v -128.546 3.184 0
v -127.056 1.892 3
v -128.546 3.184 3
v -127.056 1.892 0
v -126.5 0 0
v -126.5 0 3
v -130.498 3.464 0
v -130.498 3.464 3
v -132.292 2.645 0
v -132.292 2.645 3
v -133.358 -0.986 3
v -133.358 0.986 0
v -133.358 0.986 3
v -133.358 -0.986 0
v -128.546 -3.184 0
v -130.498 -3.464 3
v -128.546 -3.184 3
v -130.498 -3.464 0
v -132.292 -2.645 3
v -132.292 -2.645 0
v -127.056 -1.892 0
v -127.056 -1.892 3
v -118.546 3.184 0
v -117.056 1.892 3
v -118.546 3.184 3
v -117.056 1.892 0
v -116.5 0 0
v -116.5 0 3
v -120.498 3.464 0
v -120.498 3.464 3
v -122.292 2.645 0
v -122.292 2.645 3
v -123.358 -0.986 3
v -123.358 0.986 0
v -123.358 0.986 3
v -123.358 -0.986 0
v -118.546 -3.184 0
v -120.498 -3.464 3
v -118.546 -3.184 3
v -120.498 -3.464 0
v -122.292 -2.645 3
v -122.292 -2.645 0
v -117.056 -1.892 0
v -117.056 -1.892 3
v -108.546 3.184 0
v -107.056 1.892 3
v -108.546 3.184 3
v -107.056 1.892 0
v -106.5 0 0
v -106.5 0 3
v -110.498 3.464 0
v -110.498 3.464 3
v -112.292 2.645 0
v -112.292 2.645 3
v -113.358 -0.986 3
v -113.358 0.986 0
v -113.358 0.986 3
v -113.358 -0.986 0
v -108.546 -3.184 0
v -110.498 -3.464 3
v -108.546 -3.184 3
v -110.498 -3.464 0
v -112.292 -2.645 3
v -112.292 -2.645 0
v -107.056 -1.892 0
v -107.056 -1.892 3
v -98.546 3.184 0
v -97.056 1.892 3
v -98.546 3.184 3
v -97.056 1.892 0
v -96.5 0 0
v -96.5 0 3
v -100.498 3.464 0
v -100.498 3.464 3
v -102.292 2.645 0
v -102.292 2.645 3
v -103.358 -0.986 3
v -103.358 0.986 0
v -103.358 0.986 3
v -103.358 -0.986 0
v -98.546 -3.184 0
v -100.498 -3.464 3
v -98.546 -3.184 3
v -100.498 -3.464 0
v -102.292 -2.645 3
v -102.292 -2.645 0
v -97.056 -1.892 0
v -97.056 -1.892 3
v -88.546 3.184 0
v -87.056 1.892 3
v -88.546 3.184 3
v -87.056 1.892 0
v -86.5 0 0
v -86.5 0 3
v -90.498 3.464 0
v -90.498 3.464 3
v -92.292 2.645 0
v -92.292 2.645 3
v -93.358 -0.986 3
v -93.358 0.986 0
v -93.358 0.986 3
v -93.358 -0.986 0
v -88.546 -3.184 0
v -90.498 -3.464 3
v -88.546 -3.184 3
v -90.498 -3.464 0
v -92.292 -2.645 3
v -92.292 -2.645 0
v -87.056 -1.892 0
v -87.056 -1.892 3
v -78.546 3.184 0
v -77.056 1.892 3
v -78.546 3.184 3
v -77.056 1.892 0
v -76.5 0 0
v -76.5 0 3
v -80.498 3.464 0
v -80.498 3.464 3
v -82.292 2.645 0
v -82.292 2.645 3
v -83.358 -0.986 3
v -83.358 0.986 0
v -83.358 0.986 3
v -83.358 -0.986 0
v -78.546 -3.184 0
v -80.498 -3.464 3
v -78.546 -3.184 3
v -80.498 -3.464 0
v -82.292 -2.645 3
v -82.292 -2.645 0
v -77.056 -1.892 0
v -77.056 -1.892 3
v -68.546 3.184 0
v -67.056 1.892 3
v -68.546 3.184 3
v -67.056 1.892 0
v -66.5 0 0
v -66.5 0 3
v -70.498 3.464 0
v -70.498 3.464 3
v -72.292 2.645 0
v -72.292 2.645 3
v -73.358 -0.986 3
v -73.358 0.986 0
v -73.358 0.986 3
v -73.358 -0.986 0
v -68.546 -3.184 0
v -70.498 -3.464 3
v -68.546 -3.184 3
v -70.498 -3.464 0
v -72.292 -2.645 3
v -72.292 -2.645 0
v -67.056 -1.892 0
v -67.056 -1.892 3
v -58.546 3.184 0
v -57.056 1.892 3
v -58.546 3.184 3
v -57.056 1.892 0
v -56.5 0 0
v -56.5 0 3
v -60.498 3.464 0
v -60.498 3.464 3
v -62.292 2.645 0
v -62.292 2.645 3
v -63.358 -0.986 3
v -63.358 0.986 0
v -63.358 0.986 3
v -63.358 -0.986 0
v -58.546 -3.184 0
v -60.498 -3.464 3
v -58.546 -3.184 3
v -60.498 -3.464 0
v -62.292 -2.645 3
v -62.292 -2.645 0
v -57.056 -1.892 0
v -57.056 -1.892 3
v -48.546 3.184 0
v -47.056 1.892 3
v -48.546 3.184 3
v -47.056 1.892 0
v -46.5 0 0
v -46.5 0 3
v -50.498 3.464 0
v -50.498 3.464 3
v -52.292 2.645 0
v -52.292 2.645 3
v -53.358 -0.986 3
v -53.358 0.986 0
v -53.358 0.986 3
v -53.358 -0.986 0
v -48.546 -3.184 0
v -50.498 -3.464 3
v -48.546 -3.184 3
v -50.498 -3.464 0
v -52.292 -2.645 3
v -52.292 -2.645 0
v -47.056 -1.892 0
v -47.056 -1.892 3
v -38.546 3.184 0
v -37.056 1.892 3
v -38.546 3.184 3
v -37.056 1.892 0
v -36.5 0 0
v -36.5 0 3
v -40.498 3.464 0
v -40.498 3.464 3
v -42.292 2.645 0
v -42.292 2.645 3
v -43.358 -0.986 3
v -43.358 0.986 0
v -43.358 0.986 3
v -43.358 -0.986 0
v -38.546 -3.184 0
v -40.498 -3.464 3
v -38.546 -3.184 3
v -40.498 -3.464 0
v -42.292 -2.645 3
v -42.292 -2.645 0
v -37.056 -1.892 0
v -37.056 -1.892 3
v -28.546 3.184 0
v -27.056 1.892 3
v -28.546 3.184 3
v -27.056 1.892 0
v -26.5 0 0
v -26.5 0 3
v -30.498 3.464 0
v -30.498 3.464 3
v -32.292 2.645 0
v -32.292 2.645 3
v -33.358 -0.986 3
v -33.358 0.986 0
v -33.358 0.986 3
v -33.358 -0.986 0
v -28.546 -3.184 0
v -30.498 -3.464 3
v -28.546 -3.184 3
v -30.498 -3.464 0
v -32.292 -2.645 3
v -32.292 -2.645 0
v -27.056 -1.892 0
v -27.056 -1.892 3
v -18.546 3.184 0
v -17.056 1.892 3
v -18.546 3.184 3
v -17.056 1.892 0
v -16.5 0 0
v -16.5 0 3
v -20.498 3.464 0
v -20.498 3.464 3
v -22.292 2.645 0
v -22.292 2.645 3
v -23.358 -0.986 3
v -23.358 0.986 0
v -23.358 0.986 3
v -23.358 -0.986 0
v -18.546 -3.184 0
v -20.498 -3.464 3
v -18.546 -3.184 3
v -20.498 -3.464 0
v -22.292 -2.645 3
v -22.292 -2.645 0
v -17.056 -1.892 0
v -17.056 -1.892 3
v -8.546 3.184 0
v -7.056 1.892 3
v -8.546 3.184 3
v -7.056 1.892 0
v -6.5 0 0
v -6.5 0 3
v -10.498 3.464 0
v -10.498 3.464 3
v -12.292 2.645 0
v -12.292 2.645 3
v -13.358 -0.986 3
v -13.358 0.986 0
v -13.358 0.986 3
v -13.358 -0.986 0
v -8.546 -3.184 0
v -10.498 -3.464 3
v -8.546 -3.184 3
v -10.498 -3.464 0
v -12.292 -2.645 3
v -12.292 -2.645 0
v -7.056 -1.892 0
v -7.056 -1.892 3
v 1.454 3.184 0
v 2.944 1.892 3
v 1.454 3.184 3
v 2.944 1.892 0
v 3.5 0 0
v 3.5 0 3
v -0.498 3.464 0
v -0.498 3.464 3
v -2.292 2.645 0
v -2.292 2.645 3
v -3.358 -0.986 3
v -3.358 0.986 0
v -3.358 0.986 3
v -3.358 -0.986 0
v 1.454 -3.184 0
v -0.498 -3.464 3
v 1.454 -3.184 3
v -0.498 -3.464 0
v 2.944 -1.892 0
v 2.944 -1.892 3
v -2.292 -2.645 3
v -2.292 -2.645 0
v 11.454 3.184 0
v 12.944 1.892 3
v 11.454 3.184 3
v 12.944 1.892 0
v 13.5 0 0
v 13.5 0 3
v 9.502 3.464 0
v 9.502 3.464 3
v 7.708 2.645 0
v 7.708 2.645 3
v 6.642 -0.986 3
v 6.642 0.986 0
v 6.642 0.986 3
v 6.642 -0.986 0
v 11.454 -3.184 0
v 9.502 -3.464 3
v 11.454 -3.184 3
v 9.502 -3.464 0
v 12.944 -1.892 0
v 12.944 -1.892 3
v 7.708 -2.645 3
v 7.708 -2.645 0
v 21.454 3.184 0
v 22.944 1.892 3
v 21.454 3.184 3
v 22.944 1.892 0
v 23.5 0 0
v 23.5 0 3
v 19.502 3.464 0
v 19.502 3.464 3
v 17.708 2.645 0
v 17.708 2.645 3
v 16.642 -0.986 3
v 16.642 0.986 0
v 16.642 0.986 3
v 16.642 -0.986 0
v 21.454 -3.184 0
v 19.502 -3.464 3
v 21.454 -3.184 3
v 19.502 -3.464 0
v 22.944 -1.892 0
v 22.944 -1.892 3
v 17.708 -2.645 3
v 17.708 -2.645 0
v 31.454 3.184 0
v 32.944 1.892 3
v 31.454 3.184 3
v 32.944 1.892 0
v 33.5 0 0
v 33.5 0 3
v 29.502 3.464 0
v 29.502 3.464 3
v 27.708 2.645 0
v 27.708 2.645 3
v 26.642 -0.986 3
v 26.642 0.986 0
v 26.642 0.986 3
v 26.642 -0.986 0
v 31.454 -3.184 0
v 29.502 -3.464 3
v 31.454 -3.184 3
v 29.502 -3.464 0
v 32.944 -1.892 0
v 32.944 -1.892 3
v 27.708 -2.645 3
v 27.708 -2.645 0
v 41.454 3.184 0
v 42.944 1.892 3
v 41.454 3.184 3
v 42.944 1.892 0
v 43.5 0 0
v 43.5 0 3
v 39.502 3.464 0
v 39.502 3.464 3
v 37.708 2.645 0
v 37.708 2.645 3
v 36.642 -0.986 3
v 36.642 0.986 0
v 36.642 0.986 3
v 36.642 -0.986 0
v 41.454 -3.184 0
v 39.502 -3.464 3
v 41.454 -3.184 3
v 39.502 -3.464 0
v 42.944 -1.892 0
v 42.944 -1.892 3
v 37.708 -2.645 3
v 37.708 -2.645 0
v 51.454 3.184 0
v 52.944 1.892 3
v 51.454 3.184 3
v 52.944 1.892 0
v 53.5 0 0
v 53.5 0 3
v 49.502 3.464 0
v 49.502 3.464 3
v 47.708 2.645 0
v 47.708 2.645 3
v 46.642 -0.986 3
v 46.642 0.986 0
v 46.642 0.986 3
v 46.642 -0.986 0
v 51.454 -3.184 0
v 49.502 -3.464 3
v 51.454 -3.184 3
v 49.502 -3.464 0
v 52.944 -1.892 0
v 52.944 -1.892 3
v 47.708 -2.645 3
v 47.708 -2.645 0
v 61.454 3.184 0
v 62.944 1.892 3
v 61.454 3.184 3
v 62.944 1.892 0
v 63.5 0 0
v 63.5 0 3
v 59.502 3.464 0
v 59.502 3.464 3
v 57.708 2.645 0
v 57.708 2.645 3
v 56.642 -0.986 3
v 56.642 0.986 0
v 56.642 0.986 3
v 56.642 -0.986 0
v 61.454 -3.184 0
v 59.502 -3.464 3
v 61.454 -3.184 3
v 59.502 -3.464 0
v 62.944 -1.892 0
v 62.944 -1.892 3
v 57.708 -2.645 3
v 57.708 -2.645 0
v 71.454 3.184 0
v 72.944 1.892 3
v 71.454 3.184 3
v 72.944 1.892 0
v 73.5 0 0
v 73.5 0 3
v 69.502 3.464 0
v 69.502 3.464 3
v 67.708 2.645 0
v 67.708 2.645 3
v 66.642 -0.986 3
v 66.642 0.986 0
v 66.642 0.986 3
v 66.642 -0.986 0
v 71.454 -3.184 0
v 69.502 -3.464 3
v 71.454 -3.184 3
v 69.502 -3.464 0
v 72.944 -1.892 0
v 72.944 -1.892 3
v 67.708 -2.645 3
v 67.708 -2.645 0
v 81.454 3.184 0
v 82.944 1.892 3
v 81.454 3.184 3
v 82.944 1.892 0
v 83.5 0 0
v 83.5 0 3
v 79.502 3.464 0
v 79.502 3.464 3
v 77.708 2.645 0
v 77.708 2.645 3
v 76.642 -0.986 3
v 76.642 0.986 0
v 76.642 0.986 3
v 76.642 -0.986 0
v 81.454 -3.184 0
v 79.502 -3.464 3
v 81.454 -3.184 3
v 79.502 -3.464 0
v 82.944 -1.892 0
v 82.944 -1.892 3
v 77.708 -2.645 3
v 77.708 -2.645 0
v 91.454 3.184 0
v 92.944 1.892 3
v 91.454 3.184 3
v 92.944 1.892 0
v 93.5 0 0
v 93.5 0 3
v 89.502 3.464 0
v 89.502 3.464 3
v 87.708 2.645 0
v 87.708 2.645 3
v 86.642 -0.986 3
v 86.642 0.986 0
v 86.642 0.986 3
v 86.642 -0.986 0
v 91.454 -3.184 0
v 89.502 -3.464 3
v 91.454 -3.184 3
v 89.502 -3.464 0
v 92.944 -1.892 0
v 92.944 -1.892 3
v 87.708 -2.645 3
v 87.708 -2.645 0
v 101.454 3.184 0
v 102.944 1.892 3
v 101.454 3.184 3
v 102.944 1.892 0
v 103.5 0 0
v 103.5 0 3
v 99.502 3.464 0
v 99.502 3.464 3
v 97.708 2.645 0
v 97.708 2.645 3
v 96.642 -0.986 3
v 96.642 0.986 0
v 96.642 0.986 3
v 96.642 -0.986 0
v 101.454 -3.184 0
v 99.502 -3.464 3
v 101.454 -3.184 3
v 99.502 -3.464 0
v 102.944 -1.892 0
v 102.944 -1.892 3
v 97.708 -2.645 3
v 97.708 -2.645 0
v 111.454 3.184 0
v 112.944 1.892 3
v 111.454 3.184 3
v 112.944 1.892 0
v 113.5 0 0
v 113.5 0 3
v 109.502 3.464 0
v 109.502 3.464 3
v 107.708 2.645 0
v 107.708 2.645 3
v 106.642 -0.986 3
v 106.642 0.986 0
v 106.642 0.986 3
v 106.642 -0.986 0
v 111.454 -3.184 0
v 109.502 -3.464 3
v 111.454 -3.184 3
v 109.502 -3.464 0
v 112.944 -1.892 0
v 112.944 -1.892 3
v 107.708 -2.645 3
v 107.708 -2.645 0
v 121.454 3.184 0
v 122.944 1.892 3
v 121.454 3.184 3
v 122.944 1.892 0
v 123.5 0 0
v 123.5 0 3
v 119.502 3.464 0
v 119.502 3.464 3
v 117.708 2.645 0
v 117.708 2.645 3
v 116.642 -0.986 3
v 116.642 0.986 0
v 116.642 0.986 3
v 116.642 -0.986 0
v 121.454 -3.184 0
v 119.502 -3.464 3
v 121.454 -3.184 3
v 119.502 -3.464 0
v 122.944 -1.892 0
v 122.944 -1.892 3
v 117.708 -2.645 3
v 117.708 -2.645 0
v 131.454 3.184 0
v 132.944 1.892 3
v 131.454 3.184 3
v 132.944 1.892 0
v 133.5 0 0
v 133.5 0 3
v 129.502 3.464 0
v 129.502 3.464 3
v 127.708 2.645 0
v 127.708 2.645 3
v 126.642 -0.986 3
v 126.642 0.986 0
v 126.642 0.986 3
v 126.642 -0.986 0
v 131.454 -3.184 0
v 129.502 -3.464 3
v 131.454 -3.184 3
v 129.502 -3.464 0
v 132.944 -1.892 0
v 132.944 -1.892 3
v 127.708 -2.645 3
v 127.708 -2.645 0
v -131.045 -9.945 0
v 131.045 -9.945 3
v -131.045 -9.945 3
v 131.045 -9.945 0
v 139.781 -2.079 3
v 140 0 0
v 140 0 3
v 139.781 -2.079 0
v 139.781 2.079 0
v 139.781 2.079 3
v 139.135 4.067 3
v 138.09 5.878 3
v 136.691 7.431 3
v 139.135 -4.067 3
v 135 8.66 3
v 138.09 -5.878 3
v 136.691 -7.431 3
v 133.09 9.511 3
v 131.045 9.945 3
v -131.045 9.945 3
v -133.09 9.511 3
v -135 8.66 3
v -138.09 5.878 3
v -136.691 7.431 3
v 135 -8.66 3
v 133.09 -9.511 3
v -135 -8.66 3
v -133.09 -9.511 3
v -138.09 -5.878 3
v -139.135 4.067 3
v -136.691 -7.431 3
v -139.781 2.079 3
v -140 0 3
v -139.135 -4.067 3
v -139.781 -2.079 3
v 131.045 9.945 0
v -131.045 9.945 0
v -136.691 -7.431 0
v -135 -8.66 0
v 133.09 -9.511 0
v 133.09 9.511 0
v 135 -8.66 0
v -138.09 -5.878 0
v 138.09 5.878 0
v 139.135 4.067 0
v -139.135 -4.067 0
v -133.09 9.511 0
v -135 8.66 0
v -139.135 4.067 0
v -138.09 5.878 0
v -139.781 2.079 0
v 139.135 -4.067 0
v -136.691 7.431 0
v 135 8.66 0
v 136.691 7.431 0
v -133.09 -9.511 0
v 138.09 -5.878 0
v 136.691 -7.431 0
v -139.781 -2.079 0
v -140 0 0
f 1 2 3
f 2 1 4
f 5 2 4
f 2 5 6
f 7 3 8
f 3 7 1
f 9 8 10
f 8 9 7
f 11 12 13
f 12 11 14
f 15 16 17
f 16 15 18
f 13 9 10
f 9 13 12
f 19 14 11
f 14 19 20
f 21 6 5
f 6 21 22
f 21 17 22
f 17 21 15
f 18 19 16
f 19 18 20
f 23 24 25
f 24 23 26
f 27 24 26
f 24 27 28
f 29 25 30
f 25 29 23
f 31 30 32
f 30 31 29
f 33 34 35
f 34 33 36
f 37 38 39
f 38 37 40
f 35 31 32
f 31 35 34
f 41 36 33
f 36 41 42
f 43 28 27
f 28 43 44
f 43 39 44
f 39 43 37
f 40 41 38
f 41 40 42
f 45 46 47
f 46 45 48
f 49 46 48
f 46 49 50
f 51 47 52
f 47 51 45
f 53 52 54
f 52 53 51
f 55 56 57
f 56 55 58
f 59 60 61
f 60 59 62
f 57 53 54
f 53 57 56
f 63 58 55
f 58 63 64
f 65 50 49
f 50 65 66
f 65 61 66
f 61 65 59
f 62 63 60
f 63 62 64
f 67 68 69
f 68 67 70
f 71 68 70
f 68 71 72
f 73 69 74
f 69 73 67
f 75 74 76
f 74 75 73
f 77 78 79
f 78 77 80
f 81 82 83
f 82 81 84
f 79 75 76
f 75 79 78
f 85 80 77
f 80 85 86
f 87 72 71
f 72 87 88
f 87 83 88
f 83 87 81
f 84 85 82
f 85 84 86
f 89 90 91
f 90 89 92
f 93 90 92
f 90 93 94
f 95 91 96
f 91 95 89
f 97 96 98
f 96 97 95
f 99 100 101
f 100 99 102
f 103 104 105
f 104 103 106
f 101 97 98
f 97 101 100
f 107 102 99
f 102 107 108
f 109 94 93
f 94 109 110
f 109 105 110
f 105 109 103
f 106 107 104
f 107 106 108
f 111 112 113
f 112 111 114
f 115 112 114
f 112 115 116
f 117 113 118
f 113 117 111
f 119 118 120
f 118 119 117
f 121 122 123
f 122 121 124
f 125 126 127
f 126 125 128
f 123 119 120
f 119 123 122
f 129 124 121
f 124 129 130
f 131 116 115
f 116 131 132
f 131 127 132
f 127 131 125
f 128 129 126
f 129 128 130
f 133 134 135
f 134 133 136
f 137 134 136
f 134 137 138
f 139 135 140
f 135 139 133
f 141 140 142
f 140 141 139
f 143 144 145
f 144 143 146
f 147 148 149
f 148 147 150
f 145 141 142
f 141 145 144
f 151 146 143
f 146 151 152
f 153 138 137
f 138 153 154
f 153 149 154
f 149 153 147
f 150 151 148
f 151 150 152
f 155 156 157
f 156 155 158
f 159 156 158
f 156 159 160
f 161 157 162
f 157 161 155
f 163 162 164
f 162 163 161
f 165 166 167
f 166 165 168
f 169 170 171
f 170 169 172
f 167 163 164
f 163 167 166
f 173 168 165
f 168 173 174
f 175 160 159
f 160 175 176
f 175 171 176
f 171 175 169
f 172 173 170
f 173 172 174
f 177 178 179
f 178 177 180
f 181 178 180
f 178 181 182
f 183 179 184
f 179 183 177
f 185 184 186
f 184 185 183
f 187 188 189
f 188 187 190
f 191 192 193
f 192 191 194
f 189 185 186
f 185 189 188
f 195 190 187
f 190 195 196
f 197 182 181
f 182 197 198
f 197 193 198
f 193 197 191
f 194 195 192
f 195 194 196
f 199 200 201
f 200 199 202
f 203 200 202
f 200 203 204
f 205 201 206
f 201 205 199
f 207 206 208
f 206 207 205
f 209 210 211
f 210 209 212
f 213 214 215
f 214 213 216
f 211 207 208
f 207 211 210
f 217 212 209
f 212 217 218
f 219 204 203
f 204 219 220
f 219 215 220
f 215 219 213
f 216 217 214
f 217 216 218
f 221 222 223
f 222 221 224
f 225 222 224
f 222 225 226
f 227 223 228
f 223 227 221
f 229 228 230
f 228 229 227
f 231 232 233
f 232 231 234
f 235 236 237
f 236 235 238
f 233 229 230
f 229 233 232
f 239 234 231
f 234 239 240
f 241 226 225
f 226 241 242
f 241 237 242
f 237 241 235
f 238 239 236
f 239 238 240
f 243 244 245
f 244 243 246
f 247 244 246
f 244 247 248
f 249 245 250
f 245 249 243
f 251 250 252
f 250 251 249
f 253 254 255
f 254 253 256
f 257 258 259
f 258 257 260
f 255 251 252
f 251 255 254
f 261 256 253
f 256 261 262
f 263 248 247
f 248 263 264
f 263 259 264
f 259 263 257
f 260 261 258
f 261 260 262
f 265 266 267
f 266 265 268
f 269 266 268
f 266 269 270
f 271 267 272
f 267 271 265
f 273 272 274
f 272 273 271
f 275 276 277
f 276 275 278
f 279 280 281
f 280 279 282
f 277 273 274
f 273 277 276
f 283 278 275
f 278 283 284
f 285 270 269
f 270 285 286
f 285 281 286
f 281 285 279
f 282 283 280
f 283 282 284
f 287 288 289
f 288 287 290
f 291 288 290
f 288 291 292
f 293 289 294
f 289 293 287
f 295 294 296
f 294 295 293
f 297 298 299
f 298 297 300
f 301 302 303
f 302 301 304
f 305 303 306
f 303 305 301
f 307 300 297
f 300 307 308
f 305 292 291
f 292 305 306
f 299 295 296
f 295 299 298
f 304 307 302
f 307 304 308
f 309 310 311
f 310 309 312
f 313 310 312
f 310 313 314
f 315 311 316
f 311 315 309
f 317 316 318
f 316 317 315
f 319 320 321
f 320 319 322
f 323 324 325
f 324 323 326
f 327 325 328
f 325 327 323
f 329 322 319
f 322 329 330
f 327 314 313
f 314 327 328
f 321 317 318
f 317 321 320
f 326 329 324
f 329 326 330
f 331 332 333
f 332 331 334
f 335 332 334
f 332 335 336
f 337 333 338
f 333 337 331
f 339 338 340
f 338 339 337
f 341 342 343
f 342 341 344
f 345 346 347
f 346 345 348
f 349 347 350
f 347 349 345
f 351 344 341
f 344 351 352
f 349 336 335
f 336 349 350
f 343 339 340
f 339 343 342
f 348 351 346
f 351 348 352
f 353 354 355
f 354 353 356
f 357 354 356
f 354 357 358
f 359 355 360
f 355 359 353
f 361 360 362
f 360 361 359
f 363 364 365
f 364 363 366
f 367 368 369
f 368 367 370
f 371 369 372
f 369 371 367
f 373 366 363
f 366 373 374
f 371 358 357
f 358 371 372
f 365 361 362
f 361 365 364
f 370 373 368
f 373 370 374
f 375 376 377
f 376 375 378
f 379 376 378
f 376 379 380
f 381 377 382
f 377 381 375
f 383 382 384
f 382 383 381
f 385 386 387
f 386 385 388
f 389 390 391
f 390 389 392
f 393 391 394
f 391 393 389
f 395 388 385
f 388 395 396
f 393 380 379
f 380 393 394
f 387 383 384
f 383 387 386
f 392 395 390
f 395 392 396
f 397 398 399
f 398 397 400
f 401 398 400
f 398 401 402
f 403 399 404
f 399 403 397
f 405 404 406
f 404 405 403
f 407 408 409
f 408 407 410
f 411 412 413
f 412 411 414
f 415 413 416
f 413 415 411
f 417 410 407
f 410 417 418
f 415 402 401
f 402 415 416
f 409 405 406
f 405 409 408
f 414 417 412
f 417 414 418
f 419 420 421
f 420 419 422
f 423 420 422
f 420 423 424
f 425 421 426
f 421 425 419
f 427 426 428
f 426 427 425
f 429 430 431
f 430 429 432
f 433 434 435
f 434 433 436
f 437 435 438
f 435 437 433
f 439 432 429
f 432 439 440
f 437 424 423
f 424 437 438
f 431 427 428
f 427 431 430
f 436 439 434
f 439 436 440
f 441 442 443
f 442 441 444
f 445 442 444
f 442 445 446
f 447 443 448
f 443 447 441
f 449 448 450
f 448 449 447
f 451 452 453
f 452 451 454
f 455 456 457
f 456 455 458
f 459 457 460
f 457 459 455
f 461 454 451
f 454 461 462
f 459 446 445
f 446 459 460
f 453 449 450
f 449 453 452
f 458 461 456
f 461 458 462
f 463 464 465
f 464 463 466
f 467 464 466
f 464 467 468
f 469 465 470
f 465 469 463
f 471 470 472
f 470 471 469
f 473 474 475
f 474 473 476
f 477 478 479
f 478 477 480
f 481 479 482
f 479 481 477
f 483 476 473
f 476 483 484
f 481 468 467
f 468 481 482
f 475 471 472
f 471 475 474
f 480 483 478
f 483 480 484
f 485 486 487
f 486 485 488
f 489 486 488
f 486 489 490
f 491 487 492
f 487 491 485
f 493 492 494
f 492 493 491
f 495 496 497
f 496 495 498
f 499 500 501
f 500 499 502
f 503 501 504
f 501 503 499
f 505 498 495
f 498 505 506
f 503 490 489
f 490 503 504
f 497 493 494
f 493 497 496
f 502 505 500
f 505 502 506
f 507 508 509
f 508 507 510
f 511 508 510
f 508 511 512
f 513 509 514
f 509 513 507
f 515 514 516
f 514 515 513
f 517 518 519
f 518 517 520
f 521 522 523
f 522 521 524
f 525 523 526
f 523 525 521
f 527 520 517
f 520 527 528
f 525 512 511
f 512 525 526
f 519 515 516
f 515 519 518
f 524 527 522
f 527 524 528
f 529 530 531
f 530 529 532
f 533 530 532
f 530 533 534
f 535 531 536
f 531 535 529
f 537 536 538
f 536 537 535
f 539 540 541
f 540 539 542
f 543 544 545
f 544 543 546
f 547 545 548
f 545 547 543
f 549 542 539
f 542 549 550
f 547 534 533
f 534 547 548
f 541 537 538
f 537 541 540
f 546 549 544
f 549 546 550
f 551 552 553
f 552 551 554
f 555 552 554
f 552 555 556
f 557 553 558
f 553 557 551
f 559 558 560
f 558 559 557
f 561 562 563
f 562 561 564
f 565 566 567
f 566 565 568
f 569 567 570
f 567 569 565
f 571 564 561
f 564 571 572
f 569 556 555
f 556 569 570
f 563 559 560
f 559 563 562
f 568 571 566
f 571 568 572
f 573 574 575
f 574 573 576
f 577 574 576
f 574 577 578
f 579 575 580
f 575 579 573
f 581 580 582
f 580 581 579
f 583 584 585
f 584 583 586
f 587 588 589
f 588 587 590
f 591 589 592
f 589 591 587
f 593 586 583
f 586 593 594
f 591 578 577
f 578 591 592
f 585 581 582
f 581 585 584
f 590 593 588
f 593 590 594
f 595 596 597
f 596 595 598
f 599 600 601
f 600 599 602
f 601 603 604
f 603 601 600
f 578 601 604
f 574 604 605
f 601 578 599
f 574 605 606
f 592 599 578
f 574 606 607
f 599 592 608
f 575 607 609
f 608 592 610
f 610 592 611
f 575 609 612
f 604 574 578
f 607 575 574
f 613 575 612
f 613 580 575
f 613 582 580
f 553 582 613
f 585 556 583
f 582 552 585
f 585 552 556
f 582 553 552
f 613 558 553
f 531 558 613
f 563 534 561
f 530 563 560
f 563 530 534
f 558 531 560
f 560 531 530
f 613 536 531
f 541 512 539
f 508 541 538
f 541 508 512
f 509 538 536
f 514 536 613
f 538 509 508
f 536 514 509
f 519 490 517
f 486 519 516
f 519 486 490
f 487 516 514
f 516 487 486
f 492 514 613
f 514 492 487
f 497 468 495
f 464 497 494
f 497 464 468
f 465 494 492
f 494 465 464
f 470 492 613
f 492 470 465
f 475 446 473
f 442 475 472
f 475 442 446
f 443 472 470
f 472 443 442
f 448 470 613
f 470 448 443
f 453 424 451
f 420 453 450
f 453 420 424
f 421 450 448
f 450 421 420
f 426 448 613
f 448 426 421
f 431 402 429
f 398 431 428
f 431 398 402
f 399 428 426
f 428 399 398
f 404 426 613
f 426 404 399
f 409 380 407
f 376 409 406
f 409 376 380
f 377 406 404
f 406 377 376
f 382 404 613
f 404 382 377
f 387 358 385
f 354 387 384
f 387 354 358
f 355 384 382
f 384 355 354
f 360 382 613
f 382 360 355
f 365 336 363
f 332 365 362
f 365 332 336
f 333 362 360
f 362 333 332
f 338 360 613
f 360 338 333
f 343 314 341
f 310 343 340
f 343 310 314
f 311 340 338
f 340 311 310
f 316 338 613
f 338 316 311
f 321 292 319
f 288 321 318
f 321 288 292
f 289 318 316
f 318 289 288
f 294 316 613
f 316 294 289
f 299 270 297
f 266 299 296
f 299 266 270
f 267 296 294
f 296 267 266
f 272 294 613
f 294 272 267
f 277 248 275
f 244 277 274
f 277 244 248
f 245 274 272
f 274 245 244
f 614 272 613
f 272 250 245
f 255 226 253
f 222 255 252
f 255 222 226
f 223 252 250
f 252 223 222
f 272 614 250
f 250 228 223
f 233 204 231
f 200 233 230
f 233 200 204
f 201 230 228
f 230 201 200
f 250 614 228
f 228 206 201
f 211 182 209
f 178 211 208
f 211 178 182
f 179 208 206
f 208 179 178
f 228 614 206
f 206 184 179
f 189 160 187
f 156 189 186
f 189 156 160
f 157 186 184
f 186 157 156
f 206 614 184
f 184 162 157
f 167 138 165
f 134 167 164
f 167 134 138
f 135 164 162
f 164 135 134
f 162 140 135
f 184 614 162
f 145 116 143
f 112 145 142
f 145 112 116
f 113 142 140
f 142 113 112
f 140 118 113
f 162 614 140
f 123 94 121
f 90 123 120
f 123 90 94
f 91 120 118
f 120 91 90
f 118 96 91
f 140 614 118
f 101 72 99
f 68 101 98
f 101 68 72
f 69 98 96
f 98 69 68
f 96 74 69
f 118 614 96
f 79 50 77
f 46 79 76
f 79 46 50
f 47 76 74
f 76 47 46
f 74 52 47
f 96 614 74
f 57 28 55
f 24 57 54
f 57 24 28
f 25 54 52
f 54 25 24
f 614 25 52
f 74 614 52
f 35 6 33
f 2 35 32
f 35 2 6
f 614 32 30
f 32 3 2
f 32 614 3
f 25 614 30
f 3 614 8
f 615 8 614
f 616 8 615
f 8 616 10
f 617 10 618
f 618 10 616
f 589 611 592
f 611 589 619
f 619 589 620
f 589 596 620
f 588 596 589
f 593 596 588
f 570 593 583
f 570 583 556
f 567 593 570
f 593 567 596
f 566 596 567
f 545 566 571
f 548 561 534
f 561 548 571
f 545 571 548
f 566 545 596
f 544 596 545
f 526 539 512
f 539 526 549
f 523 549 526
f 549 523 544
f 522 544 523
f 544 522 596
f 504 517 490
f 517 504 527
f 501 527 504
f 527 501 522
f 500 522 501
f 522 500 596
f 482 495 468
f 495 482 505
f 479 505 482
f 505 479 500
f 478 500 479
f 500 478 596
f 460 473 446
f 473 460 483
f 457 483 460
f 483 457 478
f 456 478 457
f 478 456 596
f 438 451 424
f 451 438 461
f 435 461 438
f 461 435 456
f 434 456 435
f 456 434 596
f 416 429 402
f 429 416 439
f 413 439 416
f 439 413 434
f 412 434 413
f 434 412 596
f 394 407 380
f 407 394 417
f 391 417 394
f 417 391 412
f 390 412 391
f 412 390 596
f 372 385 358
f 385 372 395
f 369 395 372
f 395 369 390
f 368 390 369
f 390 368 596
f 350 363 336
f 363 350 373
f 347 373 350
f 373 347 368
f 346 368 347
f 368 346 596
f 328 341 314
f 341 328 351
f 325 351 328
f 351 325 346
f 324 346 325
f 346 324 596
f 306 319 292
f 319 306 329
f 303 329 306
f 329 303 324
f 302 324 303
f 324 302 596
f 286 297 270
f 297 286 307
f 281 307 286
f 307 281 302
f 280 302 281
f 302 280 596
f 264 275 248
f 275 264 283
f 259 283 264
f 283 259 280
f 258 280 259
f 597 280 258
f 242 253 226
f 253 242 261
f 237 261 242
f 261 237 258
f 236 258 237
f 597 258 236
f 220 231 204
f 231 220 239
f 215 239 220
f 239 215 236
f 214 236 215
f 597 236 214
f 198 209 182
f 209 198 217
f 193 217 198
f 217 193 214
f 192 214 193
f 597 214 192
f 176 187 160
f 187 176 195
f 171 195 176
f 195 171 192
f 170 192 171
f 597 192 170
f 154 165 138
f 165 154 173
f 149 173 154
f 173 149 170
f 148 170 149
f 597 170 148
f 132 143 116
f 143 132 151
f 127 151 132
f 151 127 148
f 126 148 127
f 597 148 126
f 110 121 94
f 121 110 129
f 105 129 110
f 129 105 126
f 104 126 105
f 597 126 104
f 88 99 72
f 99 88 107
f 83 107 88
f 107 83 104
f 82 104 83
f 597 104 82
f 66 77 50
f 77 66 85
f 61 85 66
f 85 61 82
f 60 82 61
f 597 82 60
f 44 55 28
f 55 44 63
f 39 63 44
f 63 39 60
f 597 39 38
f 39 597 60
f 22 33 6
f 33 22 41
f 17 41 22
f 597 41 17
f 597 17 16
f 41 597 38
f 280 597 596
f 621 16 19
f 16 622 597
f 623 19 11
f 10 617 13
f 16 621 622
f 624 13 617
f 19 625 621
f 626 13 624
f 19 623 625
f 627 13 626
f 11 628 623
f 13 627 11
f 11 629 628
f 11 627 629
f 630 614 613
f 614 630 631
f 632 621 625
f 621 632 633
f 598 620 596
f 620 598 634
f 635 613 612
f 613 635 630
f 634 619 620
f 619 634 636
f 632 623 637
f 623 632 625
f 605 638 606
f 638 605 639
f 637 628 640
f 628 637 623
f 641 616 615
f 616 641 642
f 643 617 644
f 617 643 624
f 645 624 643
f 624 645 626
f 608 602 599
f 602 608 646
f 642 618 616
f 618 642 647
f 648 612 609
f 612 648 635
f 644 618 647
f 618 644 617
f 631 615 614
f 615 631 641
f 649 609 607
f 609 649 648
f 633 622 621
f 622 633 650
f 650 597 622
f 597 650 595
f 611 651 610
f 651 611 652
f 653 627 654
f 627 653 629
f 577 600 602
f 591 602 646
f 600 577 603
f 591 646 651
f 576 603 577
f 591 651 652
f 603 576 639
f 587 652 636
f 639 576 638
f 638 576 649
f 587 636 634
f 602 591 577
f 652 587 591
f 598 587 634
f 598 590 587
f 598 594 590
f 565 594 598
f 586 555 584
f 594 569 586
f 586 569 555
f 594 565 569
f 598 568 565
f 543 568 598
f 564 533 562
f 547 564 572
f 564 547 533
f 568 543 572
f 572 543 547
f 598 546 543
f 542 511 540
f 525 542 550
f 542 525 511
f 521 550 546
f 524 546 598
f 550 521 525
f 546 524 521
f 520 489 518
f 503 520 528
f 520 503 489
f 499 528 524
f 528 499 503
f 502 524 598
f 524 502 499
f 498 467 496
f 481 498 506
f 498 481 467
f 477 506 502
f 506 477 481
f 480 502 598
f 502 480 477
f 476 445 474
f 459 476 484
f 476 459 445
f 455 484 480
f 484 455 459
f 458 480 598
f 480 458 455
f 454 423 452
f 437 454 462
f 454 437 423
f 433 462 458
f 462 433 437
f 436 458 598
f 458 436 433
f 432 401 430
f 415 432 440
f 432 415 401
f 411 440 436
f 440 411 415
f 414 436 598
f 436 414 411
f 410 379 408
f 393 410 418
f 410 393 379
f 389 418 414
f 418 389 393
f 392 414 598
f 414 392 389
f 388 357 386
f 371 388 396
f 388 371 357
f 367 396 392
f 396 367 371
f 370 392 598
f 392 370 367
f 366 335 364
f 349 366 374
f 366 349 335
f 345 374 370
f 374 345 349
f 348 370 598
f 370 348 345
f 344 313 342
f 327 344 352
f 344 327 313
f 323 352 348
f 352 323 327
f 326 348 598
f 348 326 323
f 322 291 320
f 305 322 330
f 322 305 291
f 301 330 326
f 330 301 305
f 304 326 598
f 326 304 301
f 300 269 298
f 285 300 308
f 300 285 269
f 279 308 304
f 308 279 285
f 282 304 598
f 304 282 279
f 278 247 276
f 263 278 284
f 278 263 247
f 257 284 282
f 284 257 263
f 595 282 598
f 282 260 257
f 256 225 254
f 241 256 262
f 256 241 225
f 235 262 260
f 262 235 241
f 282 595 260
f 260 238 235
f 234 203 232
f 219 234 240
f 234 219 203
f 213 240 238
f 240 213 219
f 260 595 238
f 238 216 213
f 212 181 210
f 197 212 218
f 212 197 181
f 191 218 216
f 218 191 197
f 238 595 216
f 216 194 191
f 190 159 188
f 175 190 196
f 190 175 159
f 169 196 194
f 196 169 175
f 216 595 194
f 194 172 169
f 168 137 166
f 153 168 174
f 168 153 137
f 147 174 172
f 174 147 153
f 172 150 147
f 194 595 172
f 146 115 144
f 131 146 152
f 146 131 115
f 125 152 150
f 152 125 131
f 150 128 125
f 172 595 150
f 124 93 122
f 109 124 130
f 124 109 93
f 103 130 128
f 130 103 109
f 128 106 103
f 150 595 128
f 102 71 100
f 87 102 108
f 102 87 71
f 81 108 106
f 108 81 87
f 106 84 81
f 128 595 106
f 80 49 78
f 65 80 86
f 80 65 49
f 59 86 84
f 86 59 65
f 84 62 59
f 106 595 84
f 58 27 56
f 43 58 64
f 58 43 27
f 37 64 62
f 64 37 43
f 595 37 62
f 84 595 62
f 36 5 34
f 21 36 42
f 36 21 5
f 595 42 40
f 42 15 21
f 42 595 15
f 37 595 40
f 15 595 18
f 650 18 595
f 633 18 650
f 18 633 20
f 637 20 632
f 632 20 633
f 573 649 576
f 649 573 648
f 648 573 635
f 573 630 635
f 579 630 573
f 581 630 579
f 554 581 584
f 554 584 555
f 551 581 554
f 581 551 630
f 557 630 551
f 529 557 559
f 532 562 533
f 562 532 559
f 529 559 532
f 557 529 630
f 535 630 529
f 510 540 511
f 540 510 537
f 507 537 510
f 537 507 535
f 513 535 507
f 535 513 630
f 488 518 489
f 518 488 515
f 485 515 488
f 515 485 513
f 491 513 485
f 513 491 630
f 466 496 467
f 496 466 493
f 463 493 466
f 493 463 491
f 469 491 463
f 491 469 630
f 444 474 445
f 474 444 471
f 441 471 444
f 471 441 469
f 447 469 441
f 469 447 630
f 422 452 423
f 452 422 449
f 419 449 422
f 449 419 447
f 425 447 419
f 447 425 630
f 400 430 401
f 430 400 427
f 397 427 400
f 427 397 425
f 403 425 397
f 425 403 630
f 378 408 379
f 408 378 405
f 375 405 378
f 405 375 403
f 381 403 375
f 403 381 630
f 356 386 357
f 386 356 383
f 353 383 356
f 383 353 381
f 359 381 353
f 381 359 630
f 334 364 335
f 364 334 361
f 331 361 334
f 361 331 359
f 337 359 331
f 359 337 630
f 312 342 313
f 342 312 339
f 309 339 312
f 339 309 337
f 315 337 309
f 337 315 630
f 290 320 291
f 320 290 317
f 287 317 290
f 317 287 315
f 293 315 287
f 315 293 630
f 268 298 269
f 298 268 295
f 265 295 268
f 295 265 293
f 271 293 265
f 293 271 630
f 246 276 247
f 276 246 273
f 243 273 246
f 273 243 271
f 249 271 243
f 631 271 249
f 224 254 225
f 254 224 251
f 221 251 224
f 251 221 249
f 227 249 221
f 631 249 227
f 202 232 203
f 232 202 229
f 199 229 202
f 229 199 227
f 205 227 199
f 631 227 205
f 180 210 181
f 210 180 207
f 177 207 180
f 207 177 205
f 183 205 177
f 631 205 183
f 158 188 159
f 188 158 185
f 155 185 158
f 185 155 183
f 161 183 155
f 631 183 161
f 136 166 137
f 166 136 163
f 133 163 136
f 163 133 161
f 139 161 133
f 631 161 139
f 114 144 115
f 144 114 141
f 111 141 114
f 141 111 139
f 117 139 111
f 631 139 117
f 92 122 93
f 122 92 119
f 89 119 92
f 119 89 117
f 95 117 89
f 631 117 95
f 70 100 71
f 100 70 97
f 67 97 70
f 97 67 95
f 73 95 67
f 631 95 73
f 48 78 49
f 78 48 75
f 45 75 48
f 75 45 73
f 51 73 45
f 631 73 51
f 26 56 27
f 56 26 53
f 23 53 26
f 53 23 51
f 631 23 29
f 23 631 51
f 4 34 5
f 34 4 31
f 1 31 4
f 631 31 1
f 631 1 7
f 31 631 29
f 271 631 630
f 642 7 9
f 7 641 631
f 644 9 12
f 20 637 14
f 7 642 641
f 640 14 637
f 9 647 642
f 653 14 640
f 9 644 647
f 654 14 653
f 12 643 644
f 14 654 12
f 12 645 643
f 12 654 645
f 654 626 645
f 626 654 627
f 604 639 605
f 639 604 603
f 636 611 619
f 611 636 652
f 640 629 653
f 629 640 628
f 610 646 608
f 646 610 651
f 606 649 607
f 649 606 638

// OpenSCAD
// 10in by 8 in

//25.4 x 20.32 cm  

// 32.5 cm at most diagonal

thickness=3;
height=20;
size=300;

difference()
{
hull()
{
translate([(size/2)-height,0,0])
cylinder(r=height/2 , h=thickness);

translate([(-size/2)+height,0,0])
cylinder(r=height/2 , h=thickness);
}

//center hole
translate([0,0,-1])
cylinder(r=3.5, h=thickness*2);

for(i=[-13:13])
{
    translate([i*10,0,-1])
   cylinder(r=3.5, h=thickness*2);
}
}
